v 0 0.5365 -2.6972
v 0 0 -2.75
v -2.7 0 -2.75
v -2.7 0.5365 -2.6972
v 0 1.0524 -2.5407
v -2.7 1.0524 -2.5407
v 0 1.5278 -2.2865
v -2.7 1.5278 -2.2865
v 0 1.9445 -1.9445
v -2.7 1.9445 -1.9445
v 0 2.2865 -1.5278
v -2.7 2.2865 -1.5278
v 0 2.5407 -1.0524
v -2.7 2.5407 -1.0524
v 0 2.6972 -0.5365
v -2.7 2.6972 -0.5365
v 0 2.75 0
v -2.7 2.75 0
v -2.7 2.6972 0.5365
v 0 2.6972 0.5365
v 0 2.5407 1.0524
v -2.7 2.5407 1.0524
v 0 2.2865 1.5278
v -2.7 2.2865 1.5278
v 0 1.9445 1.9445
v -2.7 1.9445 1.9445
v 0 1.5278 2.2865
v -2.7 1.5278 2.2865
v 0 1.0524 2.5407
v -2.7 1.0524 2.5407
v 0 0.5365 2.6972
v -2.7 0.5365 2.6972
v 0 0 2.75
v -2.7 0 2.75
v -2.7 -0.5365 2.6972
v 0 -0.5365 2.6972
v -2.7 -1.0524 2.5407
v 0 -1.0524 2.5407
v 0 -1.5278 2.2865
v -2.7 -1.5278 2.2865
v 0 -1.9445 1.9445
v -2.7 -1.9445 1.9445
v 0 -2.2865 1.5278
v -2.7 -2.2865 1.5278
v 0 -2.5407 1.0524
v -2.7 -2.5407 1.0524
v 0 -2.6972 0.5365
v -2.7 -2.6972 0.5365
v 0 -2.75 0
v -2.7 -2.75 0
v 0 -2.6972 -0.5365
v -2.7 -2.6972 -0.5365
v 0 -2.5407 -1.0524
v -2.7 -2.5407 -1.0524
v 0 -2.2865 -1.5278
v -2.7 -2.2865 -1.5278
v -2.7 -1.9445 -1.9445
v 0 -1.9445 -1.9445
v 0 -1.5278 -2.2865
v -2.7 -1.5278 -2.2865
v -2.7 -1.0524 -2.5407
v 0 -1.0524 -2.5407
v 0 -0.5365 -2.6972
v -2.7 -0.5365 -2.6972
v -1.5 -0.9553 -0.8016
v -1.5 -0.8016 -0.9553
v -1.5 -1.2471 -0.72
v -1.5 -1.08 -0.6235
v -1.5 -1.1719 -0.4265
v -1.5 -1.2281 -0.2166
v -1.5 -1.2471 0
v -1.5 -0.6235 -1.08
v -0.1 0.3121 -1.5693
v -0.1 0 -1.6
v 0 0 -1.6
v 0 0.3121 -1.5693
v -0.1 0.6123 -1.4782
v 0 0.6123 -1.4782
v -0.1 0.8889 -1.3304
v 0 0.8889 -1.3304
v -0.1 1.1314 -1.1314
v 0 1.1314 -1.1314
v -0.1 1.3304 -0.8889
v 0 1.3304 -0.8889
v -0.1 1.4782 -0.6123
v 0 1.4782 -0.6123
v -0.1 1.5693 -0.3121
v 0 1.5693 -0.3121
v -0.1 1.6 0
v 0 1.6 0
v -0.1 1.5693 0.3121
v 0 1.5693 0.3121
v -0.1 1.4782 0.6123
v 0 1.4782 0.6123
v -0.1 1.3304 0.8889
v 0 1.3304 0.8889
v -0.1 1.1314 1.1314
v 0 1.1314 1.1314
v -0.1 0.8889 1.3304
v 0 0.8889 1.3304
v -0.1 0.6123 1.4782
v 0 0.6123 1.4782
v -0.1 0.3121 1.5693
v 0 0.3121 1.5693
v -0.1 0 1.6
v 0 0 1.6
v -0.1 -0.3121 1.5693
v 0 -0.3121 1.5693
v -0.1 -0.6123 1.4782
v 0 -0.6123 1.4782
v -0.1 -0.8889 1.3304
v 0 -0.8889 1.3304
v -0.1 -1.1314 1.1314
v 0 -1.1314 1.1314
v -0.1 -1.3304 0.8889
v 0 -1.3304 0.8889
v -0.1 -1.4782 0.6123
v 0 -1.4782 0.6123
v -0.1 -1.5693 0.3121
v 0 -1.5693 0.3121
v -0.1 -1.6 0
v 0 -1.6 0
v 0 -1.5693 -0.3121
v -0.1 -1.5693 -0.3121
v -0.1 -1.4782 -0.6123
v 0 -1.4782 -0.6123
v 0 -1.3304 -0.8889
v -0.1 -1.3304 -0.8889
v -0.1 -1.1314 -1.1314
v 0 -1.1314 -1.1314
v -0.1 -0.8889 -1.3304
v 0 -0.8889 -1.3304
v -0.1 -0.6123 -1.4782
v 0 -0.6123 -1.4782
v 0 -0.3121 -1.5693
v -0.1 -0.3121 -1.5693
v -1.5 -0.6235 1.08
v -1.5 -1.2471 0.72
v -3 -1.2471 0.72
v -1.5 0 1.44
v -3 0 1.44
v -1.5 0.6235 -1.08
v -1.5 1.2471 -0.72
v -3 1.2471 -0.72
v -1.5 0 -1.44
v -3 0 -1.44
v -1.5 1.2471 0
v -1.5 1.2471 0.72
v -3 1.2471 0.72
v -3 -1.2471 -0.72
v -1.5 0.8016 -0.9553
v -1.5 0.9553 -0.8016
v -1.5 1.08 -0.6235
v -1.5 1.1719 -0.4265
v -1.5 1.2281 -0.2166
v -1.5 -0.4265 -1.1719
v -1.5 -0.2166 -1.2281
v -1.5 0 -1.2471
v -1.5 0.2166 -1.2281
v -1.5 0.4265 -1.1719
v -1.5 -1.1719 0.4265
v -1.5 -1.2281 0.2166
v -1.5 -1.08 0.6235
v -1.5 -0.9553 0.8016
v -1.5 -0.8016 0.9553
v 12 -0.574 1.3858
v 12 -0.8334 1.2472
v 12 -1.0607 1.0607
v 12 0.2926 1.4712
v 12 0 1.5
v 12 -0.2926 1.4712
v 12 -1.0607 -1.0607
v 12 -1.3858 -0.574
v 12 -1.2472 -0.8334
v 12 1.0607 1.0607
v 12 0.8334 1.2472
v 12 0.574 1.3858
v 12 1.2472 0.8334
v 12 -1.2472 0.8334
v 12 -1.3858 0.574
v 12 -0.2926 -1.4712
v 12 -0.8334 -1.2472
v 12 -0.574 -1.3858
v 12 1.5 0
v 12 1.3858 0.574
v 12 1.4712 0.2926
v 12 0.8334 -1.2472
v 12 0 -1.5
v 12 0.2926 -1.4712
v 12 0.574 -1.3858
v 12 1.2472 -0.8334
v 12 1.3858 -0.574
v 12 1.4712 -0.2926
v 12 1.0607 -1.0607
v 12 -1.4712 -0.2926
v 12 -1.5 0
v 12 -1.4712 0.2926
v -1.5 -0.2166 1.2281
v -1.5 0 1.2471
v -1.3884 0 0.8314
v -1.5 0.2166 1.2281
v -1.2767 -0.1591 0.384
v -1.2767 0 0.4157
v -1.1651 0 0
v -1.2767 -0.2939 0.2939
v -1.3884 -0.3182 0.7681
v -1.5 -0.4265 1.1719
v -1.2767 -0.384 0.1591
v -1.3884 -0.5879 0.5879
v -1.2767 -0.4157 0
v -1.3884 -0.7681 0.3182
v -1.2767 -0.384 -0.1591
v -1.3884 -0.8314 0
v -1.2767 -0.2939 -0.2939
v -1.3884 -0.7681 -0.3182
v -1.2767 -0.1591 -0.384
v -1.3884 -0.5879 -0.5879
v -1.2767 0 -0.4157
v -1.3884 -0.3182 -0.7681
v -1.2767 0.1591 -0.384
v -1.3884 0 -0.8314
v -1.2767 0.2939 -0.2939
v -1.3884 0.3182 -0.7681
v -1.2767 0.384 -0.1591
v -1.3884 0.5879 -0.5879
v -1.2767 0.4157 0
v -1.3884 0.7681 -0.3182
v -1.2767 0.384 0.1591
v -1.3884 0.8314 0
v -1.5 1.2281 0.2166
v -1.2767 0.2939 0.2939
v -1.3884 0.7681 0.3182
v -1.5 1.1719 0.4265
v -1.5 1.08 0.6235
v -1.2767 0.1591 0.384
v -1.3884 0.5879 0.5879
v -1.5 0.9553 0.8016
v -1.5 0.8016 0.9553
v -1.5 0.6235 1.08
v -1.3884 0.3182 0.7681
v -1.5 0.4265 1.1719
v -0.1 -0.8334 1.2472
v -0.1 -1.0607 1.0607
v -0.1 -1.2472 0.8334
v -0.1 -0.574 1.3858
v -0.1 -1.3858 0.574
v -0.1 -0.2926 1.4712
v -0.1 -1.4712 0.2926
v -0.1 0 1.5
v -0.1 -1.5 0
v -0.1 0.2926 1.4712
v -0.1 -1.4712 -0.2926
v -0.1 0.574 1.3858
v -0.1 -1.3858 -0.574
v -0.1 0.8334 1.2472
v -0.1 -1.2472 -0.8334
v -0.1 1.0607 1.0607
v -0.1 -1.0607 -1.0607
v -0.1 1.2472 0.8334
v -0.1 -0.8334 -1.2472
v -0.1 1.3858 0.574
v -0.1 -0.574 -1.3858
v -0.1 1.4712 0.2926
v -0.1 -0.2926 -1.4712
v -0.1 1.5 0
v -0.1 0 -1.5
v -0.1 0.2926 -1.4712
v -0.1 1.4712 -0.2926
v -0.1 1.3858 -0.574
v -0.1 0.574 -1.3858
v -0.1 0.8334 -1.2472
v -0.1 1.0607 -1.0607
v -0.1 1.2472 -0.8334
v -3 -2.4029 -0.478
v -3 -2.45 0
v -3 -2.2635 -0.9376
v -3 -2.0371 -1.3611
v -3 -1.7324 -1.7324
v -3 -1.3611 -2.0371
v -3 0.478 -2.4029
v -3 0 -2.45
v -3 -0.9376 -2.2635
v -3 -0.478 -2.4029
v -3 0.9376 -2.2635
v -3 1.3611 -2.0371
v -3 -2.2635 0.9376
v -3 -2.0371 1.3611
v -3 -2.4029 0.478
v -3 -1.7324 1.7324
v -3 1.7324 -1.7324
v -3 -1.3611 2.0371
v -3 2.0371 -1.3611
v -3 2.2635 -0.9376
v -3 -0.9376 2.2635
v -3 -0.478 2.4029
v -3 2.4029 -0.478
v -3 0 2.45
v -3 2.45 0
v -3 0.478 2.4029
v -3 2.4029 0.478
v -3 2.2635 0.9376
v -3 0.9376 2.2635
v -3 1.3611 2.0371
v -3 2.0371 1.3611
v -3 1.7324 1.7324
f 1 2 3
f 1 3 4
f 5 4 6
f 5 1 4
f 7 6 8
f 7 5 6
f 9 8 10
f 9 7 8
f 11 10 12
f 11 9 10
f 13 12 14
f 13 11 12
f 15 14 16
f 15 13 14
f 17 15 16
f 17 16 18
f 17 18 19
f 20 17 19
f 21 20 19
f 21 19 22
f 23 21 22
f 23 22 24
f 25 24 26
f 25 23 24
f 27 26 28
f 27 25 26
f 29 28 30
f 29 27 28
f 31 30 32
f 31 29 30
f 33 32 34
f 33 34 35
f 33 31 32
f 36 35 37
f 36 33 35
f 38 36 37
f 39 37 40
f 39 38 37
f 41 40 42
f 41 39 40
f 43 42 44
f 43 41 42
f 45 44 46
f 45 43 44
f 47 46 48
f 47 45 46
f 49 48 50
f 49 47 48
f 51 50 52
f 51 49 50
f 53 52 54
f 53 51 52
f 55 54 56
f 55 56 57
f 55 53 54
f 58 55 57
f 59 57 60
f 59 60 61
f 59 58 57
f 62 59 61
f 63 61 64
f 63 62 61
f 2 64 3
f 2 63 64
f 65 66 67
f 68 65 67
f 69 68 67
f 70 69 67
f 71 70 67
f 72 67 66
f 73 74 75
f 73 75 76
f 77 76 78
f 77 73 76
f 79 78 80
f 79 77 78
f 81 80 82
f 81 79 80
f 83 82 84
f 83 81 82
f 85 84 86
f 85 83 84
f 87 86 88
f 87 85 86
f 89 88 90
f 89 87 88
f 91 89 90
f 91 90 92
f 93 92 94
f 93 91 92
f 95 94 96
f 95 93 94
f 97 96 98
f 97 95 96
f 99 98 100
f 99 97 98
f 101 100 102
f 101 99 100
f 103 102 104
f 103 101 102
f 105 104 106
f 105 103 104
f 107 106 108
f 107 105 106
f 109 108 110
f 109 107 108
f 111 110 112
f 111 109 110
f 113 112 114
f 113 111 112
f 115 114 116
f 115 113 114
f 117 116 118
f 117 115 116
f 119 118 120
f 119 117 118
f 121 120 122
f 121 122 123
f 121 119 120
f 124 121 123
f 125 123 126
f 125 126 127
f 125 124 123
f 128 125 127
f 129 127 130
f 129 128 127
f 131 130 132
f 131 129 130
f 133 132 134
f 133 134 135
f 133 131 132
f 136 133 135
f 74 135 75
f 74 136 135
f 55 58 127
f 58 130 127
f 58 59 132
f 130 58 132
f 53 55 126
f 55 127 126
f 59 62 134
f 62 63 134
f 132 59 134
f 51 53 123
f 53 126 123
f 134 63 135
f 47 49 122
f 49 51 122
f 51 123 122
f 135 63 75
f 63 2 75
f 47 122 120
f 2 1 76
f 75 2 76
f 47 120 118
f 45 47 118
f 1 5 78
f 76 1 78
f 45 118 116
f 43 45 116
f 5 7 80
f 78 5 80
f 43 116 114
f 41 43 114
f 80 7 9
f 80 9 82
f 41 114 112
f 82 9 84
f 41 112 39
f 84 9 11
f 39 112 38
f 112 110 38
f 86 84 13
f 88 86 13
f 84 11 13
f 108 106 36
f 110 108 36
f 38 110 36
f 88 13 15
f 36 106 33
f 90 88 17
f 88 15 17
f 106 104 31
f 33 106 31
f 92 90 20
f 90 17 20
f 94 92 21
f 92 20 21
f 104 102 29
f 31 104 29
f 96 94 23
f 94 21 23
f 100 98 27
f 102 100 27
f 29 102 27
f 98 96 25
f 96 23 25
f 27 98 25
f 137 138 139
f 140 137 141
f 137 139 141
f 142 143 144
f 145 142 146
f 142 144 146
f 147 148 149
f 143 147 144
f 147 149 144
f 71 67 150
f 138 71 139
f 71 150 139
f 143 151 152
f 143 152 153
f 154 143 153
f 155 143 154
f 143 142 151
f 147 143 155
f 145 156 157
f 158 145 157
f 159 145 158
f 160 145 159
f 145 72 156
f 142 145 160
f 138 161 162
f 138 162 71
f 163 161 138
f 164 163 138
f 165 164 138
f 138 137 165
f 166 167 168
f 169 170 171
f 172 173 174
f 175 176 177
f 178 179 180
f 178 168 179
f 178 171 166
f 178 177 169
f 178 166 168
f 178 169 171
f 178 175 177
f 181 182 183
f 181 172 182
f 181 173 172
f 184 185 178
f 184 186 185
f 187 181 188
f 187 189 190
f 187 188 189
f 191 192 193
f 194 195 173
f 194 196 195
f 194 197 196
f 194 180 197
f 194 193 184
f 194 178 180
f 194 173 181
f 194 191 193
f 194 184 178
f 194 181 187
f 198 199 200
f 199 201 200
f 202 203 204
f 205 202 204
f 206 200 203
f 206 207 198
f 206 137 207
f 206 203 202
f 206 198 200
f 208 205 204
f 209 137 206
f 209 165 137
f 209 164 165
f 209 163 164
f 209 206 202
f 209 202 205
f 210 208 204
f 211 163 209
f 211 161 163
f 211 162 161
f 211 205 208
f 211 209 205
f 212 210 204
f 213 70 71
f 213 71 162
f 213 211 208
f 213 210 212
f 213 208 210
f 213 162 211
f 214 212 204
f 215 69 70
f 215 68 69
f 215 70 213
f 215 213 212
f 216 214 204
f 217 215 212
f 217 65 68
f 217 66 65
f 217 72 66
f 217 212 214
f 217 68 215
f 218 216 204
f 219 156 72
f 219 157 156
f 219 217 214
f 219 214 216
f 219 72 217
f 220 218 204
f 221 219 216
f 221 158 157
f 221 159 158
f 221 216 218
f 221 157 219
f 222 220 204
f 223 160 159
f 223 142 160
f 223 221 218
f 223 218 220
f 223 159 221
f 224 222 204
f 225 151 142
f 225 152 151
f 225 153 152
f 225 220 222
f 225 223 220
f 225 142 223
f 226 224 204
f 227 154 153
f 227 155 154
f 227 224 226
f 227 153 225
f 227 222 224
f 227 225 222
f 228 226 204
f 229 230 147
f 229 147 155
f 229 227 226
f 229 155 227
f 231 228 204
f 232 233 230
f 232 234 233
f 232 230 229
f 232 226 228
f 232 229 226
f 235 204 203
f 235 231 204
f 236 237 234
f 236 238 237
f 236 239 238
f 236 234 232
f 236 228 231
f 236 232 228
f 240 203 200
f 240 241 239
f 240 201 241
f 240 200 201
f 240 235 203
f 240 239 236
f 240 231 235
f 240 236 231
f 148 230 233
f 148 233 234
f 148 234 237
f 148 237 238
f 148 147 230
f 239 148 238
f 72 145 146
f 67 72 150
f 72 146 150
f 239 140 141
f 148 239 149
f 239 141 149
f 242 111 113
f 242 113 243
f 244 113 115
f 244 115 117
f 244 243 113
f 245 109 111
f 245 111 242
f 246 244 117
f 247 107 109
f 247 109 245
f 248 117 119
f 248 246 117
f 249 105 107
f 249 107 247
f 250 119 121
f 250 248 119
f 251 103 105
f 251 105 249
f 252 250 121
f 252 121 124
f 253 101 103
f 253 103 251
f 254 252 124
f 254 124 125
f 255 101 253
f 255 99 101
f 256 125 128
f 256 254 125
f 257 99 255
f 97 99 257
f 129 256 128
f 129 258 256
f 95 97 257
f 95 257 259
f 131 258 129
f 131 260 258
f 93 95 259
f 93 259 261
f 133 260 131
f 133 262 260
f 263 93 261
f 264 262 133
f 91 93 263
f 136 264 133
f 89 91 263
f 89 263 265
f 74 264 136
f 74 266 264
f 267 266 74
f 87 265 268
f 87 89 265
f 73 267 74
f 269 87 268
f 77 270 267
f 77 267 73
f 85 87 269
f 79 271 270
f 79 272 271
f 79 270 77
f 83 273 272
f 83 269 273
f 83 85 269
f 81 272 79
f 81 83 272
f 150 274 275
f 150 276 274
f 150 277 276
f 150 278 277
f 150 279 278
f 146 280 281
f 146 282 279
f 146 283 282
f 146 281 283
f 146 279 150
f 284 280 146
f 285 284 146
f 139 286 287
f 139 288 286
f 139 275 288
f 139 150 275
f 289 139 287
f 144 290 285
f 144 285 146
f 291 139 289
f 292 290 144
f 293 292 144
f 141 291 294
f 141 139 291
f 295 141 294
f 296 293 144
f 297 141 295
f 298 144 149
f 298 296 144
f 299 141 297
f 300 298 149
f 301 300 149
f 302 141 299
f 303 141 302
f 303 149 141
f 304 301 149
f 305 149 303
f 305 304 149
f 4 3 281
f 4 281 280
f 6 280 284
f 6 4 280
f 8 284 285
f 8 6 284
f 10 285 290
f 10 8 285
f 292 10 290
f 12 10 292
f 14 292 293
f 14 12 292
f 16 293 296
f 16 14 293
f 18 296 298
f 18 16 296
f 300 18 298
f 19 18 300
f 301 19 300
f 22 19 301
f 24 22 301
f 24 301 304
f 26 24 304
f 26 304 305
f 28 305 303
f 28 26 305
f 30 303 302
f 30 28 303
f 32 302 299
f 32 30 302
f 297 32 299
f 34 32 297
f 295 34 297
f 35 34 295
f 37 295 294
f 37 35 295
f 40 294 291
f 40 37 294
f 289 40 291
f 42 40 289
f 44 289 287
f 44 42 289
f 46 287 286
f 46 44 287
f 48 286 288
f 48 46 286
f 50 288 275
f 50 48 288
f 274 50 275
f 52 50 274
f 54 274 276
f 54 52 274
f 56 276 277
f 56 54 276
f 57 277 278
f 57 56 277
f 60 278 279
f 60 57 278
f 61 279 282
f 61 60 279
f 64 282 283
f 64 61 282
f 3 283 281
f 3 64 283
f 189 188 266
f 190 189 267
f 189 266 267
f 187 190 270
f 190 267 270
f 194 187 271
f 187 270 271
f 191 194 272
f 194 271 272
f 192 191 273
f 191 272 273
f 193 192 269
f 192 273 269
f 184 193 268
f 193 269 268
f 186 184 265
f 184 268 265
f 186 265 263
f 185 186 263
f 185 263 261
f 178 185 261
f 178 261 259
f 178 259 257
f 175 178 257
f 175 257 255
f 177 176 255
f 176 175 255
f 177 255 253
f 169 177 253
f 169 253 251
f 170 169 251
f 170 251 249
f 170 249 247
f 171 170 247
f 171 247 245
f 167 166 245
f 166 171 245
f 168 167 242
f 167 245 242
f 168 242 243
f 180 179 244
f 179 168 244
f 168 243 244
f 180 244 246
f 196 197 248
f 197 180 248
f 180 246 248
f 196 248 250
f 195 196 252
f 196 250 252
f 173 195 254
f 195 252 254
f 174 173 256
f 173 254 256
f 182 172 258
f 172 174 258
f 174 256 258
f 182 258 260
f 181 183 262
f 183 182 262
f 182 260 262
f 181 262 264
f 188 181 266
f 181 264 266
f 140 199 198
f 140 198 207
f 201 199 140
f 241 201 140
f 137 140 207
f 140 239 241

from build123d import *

# Parameters (mm, degrees)
SKETCH_1_W          = 3
SKETCH_1_H          = 2.75
SKETCH_2_R          = 1.5
EXTRUDE_1_DEPTH     = 100
CUT_EXTRUDE_1_DEPTH = 1.5
CHAMFER_1_SIZE      = 0.3
CUT_EXTRUDE_START   = -0.1
SKETCH_5_R          = 1.6
SKETCH_5_R_2        = 1.5
CUT_EXTRUDE_2_DEPTH = 0.1


with BuildPart() as part:
    # ｽｹｯﾁ1 → 回転1 (revolve)
    with BuildSketch(Plane.XY, mode=Mode.PRIVATE) as revolve_1_sk:
        with Locations((-1.5, 1.375)):
            Rectangle(SKETCH_1_W, SKETCH_1_H)
    revolve(revolve_1_sk.sketch.rotate(Axis((-3, 0, 0), (1, 0, 0)), 270), axis=Axis((-3, 0, 0), (1, 0, 0)))

    # ｽｹｯﾁ2 → ﾎﾞｽ - 押し出し1 (add)
    with BuildSketch(Plane(origin=(0, 0, 0), x_dir=(0, 0, -1), z_dir=(1, 0, 0))):
        Circle(SKETCH_2_R)
    extrude(amount=EXTRUDE_1_DEPTH)

    # ｽｹｯﾁ3 → ｶｯﾄ - 押し出し1 (cut)
    with BuildSketch(Plane.ZY.offset(3)):
        Polygon((-0.72, -1.247076581), (0.72, -1.247076581), (1.44, 0), (0.72, 1.247076581), (-0.72, 1.247076581), (-1.44, 0), align=None)
    extrude(amount=-CUT_EXTRUDE_1_DEPTH, mode=Mode.SUBTRACT)

    # ｽｹｯﾁ4 → ｶｯﾄ - 回転1 (revolve, cut)
    with BuildSketch(Plane.XY, mode=Mode.PRIVATE) as cut_revolve_1_sk:
        Polygon((-1.5, 1.247076581), (-1.5, 0), (-1.165063509, 0), align=None)
    revolve(cut_revolve_1_sk.sketch.rotate(Axis((-1.500025, 0, 0), (1, 0, 0)), 90), axis=Axis((-1.500025, 0, 0), (1, 0, 0)), mode=Mode.SUBTRACT)

    # 面取り1
    chamfer_1_edges = [part.edges().sort_by_distance(p)[0] for p in [
        (100, 0, 1.5),
        (-3, 0, 2.75),
    ]]
    chamfer(chamfer_1_edges, length=CHAMFER_1_SIZE)

    # ｽｹｯﾁ5 → ｶｯﾄ - 押し出し2 (cut)
    with BuildSketch(Plane(origin=(0, 0, 0), x_dir=(0, 0, -1), z_dir=(1, 0, 0)).offset(CUT_EXTRUDE_START)):
        Circle(SKETCH_5_R)
        Circle(SKETCH_5_R_2, mode=Mode.SUBTRACT)
    extrude(amount=CUT_EXTRUDE_2_DEPTH, mode=Mode.SUBTRACT)

    # Surface Cut 14
    split(bisect_by=Plane(origin=(12, 0, 0), x_dir=(0, 0, -1), z_dir=(1, 0, 0)), keep=Keep.BOTTOM)


solid = part.part
